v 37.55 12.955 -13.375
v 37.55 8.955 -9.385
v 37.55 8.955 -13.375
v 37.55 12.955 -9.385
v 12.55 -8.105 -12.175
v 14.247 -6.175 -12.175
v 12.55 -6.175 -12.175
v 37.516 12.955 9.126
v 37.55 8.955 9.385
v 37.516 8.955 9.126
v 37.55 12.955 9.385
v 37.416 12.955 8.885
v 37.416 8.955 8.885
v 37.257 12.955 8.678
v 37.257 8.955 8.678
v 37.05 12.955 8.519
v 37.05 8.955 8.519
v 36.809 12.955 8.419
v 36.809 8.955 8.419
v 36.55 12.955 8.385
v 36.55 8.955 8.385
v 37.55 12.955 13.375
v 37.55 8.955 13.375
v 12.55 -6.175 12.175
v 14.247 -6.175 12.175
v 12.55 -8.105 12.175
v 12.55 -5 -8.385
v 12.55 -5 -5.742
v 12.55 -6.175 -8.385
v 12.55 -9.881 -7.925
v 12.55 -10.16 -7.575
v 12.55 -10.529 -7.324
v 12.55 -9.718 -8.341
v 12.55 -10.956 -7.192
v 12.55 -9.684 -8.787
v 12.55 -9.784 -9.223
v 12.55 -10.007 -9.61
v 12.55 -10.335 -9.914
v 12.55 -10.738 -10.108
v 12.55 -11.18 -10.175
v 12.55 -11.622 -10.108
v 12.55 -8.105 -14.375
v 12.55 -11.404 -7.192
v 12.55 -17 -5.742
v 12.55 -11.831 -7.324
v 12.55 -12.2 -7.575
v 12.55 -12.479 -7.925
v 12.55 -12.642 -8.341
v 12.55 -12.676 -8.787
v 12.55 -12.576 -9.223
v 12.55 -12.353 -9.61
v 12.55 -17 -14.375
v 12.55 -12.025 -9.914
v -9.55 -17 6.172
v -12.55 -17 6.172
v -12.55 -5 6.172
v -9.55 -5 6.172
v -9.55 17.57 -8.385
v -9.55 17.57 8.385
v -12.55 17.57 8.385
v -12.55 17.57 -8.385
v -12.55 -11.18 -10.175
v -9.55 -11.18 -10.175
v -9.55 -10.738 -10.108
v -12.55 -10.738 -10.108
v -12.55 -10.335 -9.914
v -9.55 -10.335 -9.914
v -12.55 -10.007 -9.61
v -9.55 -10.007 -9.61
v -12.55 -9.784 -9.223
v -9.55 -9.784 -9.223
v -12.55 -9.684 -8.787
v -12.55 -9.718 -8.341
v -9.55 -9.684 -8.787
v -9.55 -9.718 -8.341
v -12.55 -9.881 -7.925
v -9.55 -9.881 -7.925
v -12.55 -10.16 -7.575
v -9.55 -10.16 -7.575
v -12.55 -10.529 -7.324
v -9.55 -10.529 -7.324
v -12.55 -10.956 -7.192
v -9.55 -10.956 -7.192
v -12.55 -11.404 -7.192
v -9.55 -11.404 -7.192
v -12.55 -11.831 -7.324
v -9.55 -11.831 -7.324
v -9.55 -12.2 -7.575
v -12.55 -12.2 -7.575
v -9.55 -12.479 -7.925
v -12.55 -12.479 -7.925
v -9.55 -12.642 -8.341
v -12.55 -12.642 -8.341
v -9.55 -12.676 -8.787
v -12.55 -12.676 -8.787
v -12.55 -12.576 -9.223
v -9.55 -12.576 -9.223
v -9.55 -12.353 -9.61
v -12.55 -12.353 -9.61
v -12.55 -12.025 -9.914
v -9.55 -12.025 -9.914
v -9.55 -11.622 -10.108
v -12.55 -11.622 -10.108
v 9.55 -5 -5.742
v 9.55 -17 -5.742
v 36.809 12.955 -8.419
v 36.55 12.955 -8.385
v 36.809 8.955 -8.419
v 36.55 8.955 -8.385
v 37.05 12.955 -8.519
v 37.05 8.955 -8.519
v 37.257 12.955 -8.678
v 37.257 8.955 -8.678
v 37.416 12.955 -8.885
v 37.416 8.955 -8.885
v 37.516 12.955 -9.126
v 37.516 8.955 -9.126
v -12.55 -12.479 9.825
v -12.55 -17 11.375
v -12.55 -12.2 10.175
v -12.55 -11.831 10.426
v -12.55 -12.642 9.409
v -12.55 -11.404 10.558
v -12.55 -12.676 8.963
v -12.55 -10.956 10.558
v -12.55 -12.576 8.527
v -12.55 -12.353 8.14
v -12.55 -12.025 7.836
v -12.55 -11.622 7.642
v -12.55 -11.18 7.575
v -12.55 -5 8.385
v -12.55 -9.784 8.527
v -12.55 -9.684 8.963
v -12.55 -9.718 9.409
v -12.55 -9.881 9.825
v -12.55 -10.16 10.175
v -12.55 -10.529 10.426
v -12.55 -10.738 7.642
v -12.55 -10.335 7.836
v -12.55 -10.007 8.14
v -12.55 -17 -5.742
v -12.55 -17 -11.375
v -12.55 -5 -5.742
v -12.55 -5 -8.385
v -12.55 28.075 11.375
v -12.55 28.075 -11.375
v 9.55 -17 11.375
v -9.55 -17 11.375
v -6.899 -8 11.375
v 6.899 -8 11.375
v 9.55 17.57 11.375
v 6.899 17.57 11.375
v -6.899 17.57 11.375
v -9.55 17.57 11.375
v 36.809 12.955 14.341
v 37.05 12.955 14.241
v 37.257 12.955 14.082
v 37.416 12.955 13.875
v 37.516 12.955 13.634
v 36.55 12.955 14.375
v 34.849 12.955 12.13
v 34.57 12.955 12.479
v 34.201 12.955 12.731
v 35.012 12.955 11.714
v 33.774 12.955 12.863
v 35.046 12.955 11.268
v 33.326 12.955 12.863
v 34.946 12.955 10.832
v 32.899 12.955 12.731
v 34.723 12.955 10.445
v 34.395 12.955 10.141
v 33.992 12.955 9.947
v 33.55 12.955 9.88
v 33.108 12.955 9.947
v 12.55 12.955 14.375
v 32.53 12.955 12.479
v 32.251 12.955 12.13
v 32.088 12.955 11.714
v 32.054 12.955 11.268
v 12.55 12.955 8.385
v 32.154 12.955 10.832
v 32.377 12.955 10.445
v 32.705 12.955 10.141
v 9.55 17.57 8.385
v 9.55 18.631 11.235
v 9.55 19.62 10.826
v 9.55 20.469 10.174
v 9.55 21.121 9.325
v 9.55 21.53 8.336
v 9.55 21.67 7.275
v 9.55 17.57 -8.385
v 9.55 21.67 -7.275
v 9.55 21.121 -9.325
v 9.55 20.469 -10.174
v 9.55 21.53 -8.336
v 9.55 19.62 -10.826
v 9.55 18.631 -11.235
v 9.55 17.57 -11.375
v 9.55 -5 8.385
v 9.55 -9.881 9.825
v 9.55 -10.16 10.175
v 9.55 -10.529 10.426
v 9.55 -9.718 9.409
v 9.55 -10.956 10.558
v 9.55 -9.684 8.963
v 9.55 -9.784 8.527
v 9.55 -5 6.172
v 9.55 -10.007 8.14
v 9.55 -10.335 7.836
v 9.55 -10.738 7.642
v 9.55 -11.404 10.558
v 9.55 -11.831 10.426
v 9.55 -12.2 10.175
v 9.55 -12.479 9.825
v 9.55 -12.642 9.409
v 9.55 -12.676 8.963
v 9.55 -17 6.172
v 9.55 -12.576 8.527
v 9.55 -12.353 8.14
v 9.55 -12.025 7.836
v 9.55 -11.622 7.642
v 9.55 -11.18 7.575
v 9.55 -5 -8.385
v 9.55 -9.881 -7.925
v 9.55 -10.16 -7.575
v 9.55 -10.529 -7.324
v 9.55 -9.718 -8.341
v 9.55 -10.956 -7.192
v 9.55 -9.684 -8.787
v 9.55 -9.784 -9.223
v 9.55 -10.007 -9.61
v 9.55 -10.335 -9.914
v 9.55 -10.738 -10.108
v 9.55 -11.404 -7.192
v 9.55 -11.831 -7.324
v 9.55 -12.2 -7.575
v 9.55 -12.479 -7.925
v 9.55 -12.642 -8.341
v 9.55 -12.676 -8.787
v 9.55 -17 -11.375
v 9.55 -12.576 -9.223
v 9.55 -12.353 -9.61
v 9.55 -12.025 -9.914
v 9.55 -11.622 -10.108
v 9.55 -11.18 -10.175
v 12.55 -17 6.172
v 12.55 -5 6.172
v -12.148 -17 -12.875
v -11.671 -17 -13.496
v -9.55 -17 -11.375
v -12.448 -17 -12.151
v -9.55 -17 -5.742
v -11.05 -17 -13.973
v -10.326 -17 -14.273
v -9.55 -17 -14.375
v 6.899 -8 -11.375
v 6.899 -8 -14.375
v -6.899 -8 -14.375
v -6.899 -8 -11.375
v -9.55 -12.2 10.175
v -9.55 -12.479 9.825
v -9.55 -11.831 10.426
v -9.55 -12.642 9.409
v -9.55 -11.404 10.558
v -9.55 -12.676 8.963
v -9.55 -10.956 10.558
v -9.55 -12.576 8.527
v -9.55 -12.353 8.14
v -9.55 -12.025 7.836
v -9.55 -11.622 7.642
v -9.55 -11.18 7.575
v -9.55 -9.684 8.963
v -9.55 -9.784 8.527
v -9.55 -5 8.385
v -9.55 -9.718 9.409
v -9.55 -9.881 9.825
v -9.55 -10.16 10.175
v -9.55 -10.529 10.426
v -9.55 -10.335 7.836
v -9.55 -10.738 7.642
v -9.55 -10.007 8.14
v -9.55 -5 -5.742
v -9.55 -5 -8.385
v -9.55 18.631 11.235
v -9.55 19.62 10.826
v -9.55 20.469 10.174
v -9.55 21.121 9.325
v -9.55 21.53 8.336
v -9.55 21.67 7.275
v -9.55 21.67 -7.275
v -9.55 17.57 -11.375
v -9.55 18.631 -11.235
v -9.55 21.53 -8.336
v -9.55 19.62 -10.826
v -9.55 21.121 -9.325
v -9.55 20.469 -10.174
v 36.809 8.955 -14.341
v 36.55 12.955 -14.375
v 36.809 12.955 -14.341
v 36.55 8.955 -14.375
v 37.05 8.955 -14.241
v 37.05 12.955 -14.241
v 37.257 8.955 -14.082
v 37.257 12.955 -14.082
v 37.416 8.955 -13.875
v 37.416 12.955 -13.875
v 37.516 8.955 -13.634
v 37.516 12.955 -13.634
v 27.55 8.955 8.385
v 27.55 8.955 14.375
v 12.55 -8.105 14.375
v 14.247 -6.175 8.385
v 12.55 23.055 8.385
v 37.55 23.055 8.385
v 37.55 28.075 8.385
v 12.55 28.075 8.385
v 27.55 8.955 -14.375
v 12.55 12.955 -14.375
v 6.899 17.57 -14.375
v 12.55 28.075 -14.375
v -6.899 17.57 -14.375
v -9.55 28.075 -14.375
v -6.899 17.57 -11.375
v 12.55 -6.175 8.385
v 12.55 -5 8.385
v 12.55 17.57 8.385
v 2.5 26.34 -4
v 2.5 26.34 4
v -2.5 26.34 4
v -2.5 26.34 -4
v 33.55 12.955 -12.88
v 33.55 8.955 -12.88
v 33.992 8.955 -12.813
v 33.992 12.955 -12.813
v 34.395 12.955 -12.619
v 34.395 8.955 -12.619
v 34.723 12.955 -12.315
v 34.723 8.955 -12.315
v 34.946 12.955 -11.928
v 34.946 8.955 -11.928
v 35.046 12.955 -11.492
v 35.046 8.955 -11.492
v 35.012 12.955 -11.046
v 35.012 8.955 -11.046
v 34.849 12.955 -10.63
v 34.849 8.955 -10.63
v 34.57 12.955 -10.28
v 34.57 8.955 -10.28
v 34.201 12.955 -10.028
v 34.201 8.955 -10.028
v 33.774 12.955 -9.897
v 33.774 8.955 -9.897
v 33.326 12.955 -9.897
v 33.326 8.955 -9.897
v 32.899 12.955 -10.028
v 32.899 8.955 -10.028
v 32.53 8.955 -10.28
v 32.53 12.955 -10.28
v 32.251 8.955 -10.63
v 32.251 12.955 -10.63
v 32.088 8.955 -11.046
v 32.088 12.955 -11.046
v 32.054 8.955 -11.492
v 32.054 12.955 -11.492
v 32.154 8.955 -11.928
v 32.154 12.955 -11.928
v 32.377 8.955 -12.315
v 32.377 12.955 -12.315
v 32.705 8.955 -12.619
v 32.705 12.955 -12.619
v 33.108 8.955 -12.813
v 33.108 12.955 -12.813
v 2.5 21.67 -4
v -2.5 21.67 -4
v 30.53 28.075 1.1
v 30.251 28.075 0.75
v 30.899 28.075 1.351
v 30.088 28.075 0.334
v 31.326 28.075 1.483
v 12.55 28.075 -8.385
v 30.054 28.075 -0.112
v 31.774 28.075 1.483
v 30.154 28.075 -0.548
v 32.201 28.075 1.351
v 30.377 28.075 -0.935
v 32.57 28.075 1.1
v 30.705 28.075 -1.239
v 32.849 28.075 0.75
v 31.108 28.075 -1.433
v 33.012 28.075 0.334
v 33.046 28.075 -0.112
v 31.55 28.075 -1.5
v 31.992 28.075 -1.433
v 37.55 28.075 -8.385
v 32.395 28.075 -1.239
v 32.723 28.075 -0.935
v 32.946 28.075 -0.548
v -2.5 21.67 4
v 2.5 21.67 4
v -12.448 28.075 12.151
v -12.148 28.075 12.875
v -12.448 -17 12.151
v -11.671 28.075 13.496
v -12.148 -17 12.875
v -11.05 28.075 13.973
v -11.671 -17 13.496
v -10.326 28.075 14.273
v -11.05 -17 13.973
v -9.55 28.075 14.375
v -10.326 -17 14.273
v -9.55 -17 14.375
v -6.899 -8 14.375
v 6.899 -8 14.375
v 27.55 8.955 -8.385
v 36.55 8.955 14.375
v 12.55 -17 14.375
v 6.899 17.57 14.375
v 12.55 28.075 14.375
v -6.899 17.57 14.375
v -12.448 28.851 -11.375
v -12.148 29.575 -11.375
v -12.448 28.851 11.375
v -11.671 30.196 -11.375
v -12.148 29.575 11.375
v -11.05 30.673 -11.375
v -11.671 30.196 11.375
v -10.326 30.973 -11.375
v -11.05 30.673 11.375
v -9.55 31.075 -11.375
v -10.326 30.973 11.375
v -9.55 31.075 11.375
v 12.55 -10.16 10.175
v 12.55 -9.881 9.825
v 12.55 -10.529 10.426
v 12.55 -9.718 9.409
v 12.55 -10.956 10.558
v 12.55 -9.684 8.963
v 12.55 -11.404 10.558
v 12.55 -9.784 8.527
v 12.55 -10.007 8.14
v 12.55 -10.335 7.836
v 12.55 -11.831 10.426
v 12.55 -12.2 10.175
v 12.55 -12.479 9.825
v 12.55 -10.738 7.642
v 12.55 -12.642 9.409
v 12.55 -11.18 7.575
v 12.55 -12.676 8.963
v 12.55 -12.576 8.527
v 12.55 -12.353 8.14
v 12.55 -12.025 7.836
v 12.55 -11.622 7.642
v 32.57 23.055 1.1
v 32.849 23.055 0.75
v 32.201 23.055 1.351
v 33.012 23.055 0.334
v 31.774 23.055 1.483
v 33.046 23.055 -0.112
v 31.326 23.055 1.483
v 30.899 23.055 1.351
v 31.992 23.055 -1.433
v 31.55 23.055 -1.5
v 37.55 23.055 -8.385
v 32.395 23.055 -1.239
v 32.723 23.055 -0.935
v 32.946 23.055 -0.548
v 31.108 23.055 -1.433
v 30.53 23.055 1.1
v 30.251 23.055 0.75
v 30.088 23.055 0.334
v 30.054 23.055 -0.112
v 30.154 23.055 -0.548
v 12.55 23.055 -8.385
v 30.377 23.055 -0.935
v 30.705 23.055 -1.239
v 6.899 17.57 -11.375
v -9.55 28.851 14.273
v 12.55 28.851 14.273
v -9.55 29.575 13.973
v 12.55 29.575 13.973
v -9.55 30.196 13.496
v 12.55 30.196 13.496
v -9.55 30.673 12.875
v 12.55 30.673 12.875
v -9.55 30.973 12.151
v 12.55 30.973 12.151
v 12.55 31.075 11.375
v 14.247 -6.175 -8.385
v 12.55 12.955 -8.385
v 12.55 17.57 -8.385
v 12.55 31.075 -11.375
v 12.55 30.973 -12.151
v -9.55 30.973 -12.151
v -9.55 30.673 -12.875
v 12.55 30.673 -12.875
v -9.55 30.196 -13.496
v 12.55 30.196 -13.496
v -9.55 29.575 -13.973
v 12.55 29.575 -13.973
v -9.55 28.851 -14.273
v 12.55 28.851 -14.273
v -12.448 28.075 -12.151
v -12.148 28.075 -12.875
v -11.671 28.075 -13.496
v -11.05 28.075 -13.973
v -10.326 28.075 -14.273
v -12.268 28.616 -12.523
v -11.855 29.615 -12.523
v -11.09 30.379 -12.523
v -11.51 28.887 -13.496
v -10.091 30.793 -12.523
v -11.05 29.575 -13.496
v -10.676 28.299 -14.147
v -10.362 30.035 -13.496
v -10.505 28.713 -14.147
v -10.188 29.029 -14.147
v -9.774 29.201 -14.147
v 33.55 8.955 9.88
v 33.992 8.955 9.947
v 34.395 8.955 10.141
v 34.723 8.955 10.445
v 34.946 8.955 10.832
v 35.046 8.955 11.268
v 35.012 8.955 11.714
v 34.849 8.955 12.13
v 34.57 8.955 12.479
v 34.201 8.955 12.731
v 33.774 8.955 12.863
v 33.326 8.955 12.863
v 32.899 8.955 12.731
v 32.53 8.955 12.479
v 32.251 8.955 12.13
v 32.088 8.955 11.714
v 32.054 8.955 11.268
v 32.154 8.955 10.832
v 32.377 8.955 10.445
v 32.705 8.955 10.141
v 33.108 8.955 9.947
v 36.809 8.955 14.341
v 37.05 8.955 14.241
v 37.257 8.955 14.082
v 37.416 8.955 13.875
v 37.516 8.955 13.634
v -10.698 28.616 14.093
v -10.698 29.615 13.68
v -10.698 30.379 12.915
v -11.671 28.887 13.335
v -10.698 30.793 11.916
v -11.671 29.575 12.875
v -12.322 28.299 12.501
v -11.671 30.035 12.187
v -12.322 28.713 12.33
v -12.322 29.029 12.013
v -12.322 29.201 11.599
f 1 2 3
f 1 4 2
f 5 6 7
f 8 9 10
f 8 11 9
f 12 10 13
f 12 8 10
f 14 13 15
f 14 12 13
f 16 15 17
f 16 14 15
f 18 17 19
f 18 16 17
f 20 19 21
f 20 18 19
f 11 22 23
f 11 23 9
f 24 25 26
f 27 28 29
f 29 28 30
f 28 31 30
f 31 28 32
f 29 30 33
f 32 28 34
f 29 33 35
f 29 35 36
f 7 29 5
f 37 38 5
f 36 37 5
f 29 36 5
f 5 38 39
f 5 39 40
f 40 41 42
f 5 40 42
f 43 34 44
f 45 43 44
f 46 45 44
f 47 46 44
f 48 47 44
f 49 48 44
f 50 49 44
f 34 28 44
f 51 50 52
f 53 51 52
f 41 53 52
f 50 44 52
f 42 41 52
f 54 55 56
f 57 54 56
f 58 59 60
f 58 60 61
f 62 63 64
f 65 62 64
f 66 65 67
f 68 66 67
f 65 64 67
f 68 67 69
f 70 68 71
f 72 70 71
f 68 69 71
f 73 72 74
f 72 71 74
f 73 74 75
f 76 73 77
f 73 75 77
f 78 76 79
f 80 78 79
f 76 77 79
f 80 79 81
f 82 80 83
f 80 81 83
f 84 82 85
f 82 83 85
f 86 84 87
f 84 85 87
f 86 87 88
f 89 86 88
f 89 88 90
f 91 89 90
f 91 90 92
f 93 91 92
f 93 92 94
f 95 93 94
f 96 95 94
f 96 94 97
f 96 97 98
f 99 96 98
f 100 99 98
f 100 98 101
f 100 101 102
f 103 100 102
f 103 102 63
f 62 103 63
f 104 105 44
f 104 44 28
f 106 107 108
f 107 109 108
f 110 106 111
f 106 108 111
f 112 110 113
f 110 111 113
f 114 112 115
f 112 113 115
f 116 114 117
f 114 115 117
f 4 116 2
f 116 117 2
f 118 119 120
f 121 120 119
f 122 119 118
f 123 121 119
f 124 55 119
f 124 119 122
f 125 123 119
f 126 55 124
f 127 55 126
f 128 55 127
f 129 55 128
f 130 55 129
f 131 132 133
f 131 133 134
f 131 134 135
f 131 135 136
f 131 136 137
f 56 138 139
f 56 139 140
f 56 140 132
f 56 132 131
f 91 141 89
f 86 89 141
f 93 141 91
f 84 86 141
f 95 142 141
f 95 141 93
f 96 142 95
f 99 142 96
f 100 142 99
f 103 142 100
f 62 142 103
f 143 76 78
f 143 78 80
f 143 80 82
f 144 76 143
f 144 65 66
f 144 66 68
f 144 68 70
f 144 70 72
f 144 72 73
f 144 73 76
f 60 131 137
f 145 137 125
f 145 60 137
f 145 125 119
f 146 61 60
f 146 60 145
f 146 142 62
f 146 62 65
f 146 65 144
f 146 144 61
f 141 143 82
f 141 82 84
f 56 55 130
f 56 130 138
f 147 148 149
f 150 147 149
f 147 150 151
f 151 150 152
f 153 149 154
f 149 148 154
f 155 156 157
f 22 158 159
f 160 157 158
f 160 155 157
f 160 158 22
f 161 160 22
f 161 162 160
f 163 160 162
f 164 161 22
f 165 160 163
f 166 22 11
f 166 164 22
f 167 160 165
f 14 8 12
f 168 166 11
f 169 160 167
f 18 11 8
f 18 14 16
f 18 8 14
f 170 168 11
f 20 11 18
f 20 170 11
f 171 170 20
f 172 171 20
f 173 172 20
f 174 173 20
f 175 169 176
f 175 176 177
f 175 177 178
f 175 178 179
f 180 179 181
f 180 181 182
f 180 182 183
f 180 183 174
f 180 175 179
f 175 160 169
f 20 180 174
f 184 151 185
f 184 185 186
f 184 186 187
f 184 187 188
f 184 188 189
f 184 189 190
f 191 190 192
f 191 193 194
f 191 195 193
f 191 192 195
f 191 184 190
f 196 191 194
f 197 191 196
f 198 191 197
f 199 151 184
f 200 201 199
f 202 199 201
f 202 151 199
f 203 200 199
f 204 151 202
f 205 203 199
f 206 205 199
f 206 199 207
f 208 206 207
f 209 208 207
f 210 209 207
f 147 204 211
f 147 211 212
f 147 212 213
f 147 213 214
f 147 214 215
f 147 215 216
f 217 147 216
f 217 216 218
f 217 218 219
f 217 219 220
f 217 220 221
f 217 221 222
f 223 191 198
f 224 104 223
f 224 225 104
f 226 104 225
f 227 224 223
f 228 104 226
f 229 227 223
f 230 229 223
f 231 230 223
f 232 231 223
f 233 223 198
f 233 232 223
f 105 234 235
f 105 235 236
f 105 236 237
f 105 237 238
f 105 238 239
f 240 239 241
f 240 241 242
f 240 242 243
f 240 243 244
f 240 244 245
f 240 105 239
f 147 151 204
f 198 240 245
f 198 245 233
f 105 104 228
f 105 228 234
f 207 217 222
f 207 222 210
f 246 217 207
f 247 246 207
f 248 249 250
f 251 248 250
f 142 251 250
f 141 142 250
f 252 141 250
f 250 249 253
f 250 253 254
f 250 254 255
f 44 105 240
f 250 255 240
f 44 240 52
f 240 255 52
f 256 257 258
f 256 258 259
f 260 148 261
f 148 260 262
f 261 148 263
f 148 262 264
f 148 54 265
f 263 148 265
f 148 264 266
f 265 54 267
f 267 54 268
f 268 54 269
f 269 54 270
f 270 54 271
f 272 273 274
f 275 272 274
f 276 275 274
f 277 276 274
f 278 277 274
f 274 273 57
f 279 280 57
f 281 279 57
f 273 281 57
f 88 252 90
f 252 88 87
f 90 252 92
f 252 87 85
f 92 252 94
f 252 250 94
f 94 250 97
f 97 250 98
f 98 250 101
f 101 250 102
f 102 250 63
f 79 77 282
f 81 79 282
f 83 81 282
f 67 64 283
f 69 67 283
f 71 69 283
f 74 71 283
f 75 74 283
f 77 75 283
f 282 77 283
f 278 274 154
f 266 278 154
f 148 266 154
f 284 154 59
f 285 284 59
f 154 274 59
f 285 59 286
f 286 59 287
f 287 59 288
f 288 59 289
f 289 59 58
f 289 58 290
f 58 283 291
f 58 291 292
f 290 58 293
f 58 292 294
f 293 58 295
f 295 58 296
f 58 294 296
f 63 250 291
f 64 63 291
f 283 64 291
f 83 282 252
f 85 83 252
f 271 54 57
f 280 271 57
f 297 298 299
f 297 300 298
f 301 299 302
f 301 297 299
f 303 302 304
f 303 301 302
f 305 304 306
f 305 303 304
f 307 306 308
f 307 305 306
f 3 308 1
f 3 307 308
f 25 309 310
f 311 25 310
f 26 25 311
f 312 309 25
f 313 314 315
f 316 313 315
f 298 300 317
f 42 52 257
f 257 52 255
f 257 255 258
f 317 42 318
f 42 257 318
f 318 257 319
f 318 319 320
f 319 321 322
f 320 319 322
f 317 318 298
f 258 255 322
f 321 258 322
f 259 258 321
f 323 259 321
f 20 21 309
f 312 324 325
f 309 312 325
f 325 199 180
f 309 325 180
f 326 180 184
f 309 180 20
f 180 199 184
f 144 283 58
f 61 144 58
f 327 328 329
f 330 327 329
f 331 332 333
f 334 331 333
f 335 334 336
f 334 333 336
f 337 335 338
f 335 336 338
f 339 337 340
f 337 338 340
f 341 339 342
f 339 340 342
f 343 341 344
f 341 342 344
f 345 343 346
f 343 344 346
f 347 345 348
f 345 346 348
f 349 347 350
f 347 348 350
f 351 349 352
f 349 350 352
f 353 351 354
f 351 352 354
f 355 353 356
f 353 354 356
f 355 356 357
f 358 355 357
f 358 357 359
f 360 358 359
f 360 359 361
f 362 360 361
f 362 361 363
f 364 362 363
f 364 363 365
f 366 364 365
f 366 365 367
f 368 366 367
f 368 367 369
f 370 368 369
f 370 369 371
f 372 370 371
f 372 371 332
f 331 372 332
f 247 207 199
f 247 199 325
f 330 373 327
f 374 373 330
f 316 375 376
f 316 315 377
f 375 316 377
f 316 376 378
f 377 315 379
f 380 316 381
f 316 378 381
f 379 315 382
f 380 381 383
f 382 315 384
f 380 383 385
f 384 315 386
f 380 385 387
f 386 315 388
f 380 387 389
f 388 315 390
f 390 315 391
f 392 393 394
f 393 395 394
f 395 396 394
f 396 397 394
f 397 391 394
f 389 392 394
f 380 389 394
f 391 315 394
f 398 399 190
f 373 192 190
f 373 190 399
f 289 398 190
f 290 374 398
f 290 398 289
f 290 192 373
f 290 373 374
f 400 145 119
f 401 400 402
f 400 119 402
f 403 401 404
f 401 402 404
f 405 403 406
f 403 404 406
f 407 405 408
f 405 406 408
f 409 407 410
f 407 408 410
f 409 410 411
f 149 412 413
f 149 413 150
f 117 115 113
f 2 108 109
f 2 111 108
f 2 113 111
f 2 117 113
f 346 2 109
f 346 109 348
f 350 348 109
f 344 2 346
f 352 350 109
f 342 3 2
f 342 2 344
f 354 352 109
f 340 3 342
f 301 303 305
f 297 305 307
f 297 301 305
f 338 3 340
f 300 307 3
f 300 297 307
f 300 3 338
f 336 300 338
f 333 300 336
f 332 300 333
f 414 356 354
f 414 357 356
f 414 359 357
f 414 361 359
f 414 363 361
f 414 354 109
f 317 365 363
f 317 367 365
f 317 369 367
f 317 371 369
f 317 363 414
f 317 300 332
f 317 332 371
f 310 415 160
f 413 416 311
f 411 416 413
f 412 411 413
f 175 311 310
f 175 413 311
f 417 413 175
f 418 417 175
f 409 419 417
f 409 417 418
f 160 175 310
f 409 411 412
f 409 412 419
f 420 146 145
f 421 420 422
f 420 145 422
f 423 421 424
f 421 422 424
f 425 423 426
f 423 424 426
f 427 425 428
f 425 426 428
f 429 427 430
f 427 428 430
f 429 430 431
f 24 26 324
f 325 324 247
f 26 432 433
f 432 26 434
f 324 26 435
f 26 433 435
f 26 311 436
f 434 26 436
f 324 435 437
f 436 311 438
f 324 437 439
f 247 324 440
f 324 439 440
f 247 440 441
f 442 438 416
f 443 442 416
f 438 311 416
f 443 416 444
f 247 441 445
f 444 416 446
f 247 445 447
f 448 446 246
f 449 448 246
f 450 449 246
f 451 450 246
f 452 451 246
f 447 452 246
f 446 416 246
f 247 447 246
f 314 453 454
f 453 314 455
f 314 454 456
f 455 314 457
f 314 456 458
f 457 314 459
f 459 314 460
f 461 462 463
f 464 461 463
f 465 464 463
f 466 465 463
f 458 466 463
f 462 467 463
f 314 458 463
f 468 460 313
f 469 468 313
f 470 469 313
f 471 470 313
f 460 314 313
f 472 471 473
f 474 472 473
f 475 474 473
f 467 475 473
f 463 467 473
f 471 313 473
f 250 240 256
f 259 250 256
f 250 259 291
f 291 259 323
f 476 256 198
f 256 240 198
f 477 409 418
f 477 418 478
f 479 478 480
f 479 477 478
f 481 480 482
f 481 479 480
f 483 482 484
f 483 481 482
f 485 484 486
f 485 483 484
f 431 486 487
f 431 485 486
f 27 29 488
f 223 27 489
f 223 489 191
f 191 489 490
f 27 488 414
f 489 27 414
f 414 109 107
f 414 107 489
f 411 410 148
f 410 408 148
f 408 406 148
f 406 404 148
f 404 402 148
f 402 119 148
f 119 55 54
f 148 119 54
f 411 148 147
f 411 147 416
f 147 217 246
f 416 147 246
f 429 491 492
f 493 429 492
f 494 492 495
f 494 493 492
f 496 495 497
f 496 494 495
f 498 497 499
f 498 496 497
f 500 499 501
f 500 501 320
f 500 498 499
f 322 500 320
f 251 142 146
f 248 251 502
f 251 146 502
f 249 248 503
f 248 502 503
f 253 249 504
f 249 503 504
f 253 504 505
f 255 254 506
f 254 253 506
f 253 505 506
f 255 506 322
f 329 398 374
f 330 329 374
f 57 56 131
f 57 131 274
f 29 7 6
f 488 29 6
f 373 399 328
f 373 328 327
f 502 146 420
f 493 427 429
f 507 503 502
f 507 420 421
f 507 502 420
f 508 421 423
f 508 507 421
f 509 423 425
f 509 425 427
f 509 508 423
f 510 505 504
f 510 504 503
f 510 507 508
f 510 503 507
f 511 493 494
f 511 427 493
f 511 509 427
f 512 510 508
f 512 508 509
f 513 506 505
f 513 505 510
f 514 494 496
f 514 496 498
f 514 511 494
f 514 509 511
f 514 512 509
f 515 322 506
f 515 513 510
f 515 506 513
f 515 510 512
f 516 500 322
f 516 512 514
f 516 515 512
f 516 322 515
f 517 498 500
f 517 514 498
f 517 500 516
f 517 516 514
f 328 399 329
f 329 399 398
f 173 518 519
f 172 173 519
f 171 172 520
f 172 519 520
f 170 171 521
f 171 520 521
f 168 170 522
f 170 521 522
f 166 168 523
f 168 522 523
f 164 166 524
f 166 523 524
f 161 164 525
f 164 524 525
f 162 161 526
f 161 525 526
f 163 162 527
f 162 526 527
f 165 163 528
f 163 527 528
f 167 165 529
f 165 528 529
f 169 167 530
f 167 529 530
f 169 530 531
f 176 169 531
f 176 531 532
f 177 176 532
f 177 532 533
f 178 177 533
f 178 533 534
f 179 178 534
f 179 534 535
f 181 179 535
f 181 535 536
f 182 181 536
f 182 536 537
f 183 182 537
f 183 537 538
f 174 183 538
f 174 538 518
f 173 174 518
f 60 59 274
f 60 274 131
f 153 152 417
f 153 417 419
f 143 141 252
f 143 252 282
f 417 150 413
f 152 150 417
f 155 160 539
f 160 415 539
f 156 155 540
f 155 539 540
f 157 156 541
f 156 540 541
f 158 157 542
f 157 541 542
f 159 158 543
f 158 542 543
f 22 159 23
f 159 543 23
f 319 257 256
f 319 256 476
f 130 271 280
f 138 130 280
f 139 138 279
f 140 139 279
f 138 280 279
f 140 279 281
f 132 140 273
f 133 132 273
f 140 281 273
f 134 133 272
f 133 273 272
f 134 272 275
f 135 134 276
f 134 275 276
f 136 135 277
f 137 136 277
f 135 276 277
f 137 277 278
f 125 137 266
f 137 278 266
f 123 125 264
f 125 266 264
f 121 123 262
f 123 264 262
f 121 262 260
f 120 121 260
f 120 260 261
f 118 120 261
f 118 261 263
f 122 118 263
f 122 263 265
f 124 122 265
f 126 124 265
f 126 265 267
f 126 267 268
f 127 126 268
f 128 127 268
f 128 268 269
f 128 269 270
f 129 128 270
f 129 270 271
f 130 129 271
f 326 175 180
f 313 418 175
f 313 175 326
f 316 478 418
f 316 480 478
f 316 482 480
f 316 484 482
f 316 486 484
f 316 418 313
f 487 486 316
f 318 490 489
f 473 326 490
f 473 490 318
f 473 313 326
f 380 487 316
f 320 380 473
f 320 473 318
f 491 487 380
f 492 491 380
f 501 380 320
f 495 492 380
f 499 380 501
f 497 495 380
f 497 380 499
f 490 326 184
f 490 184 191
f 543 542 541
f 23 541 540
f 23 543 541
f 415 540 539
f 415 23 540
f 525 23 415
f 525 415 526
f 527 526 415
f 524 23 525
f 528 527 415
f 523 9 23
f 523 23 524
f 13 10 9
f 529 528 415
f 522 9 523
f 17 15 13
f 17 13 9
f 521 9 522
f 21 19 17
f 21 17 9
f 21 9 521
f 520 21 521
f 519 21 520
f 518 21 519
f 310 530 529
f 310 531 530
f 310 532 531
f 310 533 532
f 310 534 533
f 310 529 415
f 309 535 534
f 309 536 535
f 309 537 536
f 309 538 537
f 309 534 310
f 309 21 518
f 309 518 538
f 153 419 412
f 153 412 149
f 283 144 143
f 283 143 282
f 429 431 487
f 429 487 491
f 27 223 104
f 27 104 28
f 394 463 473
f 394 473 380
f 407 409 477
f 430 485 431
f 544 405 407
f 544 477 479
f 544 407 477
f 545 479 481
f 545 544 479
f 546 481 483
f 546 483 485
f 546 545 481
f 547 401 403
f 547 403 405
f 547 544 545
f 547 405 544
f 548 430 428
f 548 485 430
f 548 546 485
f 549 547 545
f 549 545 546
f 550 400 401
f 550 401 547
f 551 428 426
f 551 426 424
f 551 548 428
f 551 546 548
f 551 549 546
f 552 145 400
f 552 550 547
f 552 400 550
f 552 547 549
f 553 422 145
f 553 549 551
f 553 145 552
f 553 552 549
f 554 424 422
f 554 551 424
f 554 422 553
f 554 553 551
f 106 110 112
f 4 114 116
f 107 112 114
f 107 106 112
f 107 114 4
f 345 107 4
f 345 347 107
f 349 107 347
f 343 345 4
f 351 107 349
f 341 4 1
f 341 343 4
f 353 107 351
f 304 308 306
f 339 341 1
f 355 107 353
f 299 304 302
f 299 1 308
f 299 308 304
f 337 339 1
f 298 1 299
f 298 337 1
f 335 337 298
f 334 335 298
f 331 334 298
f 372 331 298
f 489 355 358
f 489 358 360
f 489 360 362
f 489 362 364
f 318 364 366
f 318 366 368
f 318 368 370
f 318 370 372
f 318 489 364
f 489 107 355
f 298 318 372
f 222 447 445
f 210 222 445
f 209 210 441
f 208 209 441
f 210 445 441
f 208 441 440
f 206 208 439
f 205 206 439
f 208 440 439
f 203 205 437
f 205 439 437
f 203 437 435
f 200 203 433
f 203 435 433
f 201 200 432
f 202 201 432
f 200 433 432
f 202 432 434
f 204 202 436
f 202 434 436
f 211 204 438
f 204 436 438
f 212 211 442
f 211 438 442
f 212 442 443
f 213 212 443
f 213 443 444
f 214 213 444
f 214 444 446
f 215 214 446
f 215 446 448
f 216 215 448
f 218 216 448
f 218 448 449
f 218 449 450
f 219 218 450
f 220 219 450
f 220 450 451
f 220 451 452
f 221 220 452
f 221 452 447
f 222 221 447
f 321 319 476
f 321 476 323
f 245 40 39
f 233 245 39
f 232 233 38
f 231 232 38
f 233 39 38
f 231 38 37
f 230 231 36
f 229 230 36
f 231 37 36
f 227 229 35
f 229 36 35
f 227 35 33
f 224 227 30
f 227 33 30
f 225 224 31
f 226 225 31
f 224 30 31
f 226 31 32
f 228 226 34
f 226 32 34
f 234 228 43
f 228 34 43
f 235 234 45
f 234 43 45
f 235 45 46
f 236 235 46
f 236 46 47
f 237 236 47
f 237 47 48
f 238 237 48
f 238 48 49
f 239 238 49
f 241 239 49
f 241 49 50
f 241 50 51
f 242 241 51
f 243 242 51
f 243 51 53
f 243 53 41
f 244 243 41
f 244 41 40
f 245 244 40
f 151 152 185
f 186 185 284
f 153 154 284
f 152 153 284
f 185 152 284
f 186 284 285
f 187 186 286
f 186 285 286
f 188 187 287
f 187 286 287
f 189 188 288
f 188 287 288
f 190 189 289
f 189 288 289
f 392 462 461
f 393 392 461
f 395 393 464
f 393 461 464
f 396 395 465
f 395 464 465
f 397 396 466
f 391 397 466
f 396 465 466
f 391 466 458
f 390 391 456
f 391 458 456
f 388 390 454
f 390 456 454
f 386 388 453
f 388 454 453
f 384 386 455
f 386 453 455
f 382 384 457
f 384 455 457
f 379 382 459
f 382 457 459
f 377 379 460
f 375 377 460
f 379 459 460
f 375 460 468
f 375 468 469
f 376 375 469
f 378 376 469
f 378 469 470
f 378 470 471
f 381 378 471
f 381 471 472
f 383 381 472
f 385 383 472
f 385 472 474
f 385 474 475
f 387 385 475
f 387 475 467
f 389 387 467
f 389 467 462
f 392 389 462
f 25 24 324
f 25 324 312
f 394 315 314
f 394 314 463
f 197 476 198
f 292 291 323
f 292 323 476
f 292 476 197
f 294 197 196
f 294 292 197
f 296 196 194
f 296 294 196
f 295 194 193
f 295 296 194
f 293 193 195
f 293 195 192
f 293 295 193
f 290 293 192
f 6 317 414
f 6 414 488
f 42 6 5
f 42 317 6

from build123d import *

# Parameters (mm, degrees)
SKETCH4_W            = 25.1
SKETCH4_H            = 28.75
BOSS_EXTRUDE2_DEPTH  = 53
SKETCH5_W            = 19.1
SKETCH5_H            = 22.75
CUT_EXTRUDE1_DEPTH   = 21.67
FILLET1_R            = 4.1
SKETCH6_W            = 5
SKETCH6_H            = 8
CUT_EXTRUDE2_DEPTH   = 4.67
SKETCH7_W            = 16.769550268
SKETCH7_H            = 35.14
CUT_EXTRUDE3_DEPTH   = 40
SKETCH8_W            = 13.798322684
SKETCH8_H            = 35.14
CUT_EXTRUDE4_DEPTH   = 40
BOSS_EXTRUDE3_DEPTH  = 17
SKETCH10_W           = 3
SKETCH10_H           = 9
BOSS_EXTRUDE4_DEPTH  = 13.8
SKETCH11_W           = 3
SKETCH11_H           = 9
BOSS_EXTRUDE5_DEPTH  = 13.8
SKETCH12_W           = 3
SKETCH12_H           = 12
BOSS_EXTRUDE6_DEPTH  = 16.77
SKETCH24_R           = 1.5
CUT_EXTRUDE6_DEPTH   = 40.8
SKETCH25_W           = 28.75
SKETCH25_H           = 21.925089144
CUT_EXTRUDE7_DEPTH   = 40.8
SKETCH26_W           = 11.913987102
SKETCH26_H           = 12
CUT_EXTRUDE8_DEPTH   = 40.8
SKETCH30_W           = 28.75
SKETCH30_H           = 8.02
BOSS_EXTRUDE10_DEPTH = 30
SKETCH32_W           = 5.990224866
SKETCH32_H           = 21.060252184
BOSS_EXTRUDE13_DEPTH = 30
CUT_EXTRUDE9_DEPTH   = 30
SKETCH36_W           = 5
SKETCH36_H           = 28.75
CUT_EXTRUDE10_DEPTH  = 30
SKETCH38_W           = 5.99
SKETCH38_H           = 8.02
CUT_EXTRUDE11_DEPTH  = 25
SKETCH39_R           = 1.5
CUT_EXTRUDE12_DEPTH  = 25
SKETCH40_R           = 1.5
CUT_EXTRUDE13_DEPTH  = 25
FILLET4_R            = 3
FILLET5_R            = 3
FILLET7_R            = 1
SKETCH41_W           = 16.77
SKETCH41_H           = 3
CUT_EXTRUDE14_DEPTH  = 25
CUT_EXTRUDE15_DEPTH  = 3.79
CUT_EXTRUDE16_DEPTH  = 3.79


with BuildPart() as part:
    # Sketch4 → Boss-Extrude2 (new body)
    with BuildSketch(Plane(origin=(0, 0, 0), x_dir=(1, 0, 0), z_dir=(0, 1, 0))):
        Rectangle(SKETCH4_W, SKETCH4_H)
    extrude(amount=BOSS_EXTRUDE2_DEPTH)

    # Sketch5 → Cut-Extrude1 (cut)
    with BuildSketch(Plane(origin=(0, 0, 0), x_dir=(-1, 0, 0), z_dir=(0, -1, 0))):
        Rectangle(SKETCH5_W, SKETCH5_H)
    extrude(amount=-CUT_EXTRUDE1_DEPTH, mode=Mode.SUBTRACT)

    # Fillet1
    fillet1_edges = [part.edges().sort_by_distance(p)[0] for p in [
        (0, 21.67, -11.375),
        (0, 21.67, 11.375),
    ]]
    fillet(fillet1_edges, radius=FILLET1_R)

    # Sketch6 → Cut-Extrude2 (cut)
    with BuildSketch(Plane(origin=(0, 21.67, 0), x_dir=(-1, 0, 0), z_dir=(0, -1, 0))):
        Rectangle(SKETCH6_W, SKETCH6_H)
    extrude(amount=-CUT_EXTRUDE2_DEPTH, mode=Mode.SUBTRACT)

    # Sketch7 → Cut-Extrude3 (cut)
    with BuildSketch(Plane(origin=(12.55, 0, 0), x_dir=(0, 0, -1), z_dir=(1, 0, 0))):
        Rectangle(SKETCH7_W, SKETCH7_H)
    extrude(amount=-CUT_EXTRUDE3_DEPTH, mode=Mode.SUBTRACT)

    # Sketch8 → Cut-Extrude4 (cut)
    with BuildSketch(Plane(origin=(0, 0, -14.375), x_dir=(-1, 0, 0), z_dir=(0, 0, -1))):
        Rectangle(SKETCH8_W, SKETCH8_H)
    extrude(amount=-CUT_EXTRUDE4_DEPTH, mode=Mode.SUBTRACT)

    # Sketch9 → Boss-Extrude3 (add)
    with BuildSketch(Plane.XZ):
        Polygon((-9.55, 8.384775134), (-12.55, 8.384775134), (-12.55, 14.375), (-6.899161342, 14.375), (-6.899161342, 11.375), (-9.55, 11.375), align=None)
        Polygon((-9.55, -8.384775134), (-12.55, -8.384775134), (-12.55, -14.375), (-6.899161342, -14.375), (-6.899161342, -11.375), (-9.55, -11.375), align=None)
        Polygon((6.899161342, -11.375), (6.899161342, -14.375), (12.55, -14.375), (12.55, -8.384775134), (9.55, -8.384775134), (9.55, -11.375), align=None)
        Polygon((9.55, 8.384775134), (12.55, 8.384775134), (12.55, 14.375), (6.899161342, 14.375), (6.899161342, 11.375), (9.55, 11.375), align=None)
    extrude(amount=BOSS_EXTRUDE3_DEPTH)

    # Sketch10 → Boss-Extrude4 (add)
    with BuildSketch(Plane(origin=(-6.899161342, 0, 0), x_dir=(0, 0, -1), z_dir=(1, 0, 0))):
        with Locations((-12.875, -12.5)):
            Rectangle(SKETCH10_W, SKETCH10_H)
    extrude(amount=BOSS_EXTRUDE4_DEPTH)

    # Sketch11 → Boss-Extrude5 (add)
    with BuildSketch(Plane.ZY.offset(-6.899161342)):
        with Locations((-12.875, -12.5)):
            Rectangle(SKETCH11_W, SKETCH11_H)
    extrude(amount=BOSS_EXTRUDE5_DEPTH)

    # Sketch12 → Boss-Extrude6 (add)
    with BuildSketch(Plane.XY.offset(-8.384775134)):
        with Locations((-11.05, -11)):
            Rectangle(SKETCH12_W, SKETCH12_H)
        with Locations((11.05, -11)):
            Rectangle(SKETCH12_W, SKETCH12_H)
    extrude(amount=BOSS_EXTRUDE6_DEPTH)

    # Sketch24 → Cut-Extrude6 (cut)
    with BuildSketch(Plane(origin=(12.55, 0, 0), x_dir=(0, 0, -1), z_dir=(1, 0, 0))):
        with Locations((8.675, -11.18)):
            Circle(SKETCH24_R)
        with Locations((-9.075, -11.18)):
            Circle(SKETCH24_R)
    extrude(amount=-CUT_EXTRUDE6_DEPTH, mode=Mode.SUBTRACT)

    # Sketch25 → Cut-Extrude7 (cut)
    with BuildSketch(Plane.ZY.offset(12.55)):
        with Locations((0, 42.037455428)):
            Rectangle(SKETCH25_W, SKETCH25_H)
    extrude(amount=-CUT_EXTRUDE7_DEPTH, mode=Mode.SUBTRACT)

    # Sketch26 → Cut-Extrude8 (cut)
    with BuildSketch(Plane.ZY.offset(12.55)):
        with Locations((0.21531302, -11)):
            Rectangle(SKETCH26_W, SKETCH26_H)
    extrude(amount=-CUT_EXTRUDE8_DEPTH, mode=Mode.SUBTRACT)

    # Sketch30 → Boss-Extrude10 (add)
    with BuildSketch(Plane(origin=(12.55, 0, 0), x_dir=(0, 0, -1), z_dir=(1, 0, 0))):
        with Locations((0, 27.064910856)):
            Rectangle(SKETCH30_W, SKETCH30_H)
    extrude(amount=BOSS_EXTRUDE10_DEPTH)

    # Sketch32 → Boss-Extrude13 (add)
    with BuildSketch(Plane(origin=(12.55, 0, 0), x_dir=(0, 0, -1), z_dir=(1, 0, 0))):
        with Locations((-11.379887567, 2.424784764)):
            Rectangle(SKETCH32_W, SKETCH32_H)
        with Locations((11.379887567, 2.424784764)):
            Rectangle(SKETCH32_W, SKETCH32_H)
    extrude(amount=BOSS_EXTRUDE13_DEPTH)

    # Sketch35 → Cut-Extrude9 (cut)
    with BuildSketch(Plane(origin=(0, 0, -14.375), x_dir=(-1, 0, 0), z_dir=(0, 0, -1))):
        Polygon((-42.55, 8.954910856), (-27.55, 8.954910856), (-12.55, -8.105341328), (-42.55, -8.105341328), align=None)
    extrude(amount=-CUT_EXTRUDE9_DEPTH, mode=Mode.SUBTRACT)

    # Sketch36 → Cut-Extrude10 (cut)
    with BuildSketch(Plane(origin=(0, 31.074910856, 0), x_dir=(1, 0, 0), z_dir=(0, 1, 0))):
        with Locations((40.05, 0)):
            Rectangle(SKETCH36_W, SKETCH36_H)
    extrude(amount=-CUT_EXTRUDE10_DEPTH, mode=Mode.SUBTRACT)

    # Sketch38 → Cut-Extrude11 (cut)
    with BuildSketch(Plane(origin=(37.55, 0, 0), x_dir=(0, 0, -1), z_dir=(1, 0, 0))):
        with Locations((-11.38, 27.064910856)):
            Rectangle(SKETCH38_W, SKETCH38_H)
        with Locations((11.38, 27.064910856)):
            Rectangle(SKETCH38_W, SKETCH38_H)
    extrude(amount=-CUT_EXTRUDE11_DEPTH, mode=Mode.SUBTRACT)

    # Sketch39 → Cut-Extrude12 (cut)
    with BuildSketch(Plane(origin=(0, 8.954910856, 0), x_dir=(-1, 0, 0), z_dir=(0, -1, 0))):
        with Locations(Location((-33.55, 11.379887567, 0), (0, 0, 90))):
            Circle(SKETCH39_R)
        with Locations(Location((-33.55, -11.379887567, 0), (0, 0, 90))):
            Circle(SKETCH39_R)
    extrude(amount=-CUT_EXTRUDE12_DEPTH, mode=Mode.SUBTRACT)

    # Sketch40 → Cut-Extrude13 (cut)
    with BuildSketch(Plane.XZ.offset(-23.054910856)):
        with Locations(Location((31.55, 0, 0), (0, 0, 270))):
            Circle(SKETCH40_R)
    extrude(amount=-CUT_EXTRUDE13_DEPTH, mode=Mode.SUBTRACT)

    # Fillet4
    fillet4_edges = [part.edges().sort_by_distance(p)[0] for p in [
        (-12.55, 31.074910856, 0),
        (0, 31.074910856, 14.375),
        (0, 31.074910856, -14.375),
    ]]
    fillet(fillet4_edges, radius=FILLET4_R)

    # Fillet5
    # the kernel refuses this fillet: 3 mm, written as the material it takes off along each edge
    with BuildSketch(Plane(origin=(-9.55, 28.074910856, 11.375), x_dir=(0, 0, 1), z_dir=(-1, 0, 0))) as fillet5_piece_1_section:
        Polygon((0, 0), (FILLET5_R, 0), (FILLET5_R, FILLET5_R), (0, FILLET5_R), align=None)
    fillet5_piece_1 = extrude(amount=FILLET5_R, mode=Mode.PRIVATE)
    fillet5_piece_1 = fillet5_piece_1 - Plane(origin=(-9.55, 28.074910856, 11.375), x_dir=(0, -0.7071067811865475, -0.7071067811865475), z_dir=(-1, 0, 0)) * Sphere(FILLET5_R, mode=Mode.PRIVATE)
    add(fillet5_piece_1, mode=Mode.SUBTRACT)
    with BuildSketch(Plane(origin=(-9.55, 28.074910856, -11.375), x_dir=(-1, 0, 0), z_dir=(0, 0, -1))) as fillet5_piece_2_section:
        Polygon((0, 0), (FILLET5_R, 0), (FILLET5_R, FILLET5_R), (0, FILLET5_R), align=None)
    fillet5_piece_2 = extrude(amount=FILLET5_R, mode=Mode.PRIVATE)
    fillet5_piece_2 = fillet5_piece_2 - Plane(origin=(-9.55, 28.074910856, -11.375), x_dir=(0.7071067811865475, -0.7071067811865475, 0), z_dir=(0, 0, -1)) * Sphere(FILLET5_R, mode=Mode.PRIVATE)
    add(fillet5_piece_2, mode=Mode.SUBTRACT)
    with BuildSketch(Plane(origin=(-12.55, 28.074910856, -14.375), x_dir=(1, 0, 0), z_dir=(0, -1, 0))) as fillet5_piece_3:
        with BuildLine():
            CenterArc((FILLET5_R, FILLET5_R), FILLET5_R, 180, 90)
            Line((0, FILLET5_R), (0, 0))
            Line((0, 0), (FILLET5_R, 0))
        make_face()
    extrude(amount=52.574910856, mode=Mode.SUBTRACT)
    with BuildSketch(Plane(origin=(-12.55, -24.5, 14.375), x_dir=(0, 0, -1), z_dir=(0, 1, 0))) as fillet5_piece_4:
        with BuildLine():
            CenterArc((FILLET5_R, -FILLET5_R), FILLET5_R, 90, 90)
            Line((0, -FILLET5_R), (0, 0))
            Line((0, 0), (FILLET5_R, 0))
        make_face()
    extrude(amount=52.574910856, mode=Mode.SUBTRACT)

    # Fillet7
    fillet7_edges = [part.edges().sort_by_distance(p)[0] for p in [
        (37.55, 10.954910856, -14.375),
        (37.55, 10.954910856, -8.384775134),
        (37.55, 10.954910856, 14.375),
        (37.55, 10.954910856, 8.384775134),
    ]]
    fillet(fillet7_edges, radius=FILLET7_R)

    # Sketch41 → Cut-Extrude14 (cut)
    with BuildSketch(Plane(origin=(37.55, 0, 0), x_dir=(0, 0, -1), z_dir=(1, 0, 0))):
        with Locations((0, 29.574910856)):
            Rectangle(SKETCH41_W, SKETCH41_H)
    extrude(amount=-CUT_EXTRUDE14_DEPTH, mode=Mode.SUBTRACT)

    # Sketch43 → Cut-Extrude15 (cut)
    with BuildSketch(Plane(origin=(0, 0, 8.384775134), x_dir=(-1, 0, 0), z_dir=(0, 0, -1))):
        Polygon((-12.55, -8.105341328), (-12.55, -6.175341328), (-14.24692685, -6.175341328), align=None)
    extrude(amount=-CUT_EXTRUDE15_DEPTH, mode=Mode.SUBTRACT)

    # Sketch44 → Cut-Extrude16 (cut)
    with BuildSketch(Plane.XY.offset(-8.384775134)):
        Polygon((12.55, -8.105341328), (12.55, -6.175341328), (14.24692685, -6.175341328), align=None)
    extrude(amount=-CUT_EXTRUDE16_DEPTH, mode=Mode.SUBTRACT)


solid = part.part
